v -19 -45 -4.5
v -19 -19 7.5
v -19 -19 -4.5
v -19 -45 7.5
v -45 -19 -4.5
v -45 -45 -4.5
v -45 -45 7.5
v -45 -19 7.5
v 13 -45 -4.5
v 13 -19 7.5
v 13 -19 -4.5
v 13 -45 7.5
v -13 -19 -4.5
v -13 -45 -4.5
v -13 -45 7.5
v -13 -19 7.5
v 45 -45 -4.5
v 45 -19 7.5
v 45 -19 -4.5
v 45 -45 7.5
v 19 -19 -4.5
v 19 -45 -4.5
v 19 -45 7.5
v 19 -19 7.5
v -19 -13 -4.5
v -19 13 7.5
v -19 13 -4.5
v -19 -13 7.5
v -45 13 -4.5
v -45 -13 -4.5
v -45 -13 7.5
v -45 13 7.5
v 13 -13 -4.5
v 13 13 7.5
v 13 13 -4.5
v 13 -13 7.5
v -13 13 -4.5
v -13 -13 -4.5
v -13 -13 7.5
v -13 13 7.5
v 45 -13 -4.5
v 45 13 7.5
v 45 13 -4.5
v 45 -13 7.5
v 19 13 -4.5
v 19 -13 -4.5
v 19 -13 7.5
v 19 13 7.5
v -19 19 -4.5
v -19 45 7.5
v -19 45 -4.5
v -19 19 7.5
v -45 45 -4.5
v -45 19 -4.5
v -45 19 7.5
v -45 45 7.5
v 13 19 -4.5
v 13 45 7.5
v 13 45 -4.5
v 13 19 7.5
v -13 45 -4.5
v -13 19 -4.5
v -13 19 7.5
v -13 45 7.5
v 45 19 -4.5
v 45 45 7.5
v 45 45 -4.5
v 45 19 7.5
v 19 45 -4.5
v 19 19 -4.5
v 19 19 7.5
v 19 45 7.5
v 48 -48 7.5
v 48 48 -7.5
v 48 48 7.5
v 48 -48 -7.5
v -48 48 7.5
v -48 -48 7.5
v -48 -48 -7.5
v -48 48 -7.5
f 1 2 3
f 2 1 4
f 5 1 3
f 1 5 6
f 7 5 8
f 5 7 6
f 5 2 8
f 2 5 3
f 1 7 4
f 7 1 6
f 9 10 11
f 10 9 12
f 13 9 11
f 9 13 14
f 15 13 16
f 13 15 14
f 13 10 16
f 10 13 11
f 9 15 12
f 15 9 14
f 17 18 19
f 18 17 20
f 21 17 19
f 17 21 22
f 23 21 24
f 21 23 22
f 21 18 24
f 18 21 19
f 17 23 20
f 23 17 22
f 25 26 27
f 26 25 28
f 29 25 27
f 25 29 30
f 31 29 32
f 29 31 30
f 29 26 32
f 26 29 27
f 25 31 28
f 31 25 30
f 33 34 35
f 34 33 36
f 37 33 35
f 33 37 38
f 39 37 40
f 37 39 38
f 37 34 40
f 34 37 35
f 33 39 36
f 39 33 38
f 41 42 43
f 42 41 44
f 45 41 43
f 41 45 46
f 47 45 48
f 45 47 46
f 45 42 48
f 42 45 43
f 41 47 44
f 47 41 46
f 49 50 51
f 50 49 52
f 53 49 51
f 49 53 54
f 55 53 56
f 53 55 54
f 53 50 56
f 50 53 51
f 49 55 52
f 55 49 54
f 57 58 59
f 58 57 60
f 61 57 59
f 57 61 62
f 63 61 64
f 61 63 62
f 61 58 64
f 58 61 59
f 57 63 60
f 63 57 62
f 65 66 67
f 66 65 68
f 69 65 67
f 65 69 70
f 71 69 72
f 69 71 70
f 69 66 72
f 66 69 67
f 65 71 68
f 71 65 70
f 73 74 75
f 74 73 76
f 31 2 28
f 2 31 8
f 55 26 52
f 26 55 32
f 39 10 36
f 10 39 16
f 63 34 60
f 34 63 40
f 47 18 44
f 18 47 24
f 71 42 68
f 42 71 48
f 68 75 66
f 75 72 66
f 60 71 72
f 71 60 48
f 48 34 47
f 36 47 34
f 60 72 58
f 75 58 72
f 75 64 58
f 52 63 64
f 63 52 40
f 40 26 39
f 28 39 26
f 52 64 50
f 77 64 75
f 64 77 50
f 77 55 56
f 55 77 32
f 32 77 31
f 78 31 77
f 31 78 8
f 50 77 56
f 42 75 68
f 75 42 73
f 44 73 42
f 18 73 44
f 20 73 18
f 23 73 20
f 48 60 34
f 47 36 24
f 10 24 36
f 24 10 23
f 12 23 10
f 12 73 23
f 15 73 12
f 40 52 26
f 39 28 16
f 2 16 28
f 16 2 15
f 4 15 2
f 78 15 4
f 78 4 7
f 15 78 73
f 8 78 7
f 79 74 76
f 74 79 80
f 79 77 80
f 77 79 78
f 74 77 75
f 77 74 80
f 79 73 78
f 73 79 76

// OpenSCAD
$fn = 32;

// ----------------------------------------------------------------------
// Pocket plate 96 x 96 x 15
// 3 x 3 pockets 26 mm square, 12 mm deep
// ----------------------------------------------------------------------

// --- parameters (mm) ---
thickness = 15;  // plate thickness
floor_t = 3;     // material left under each pocket
pocket = 26;     // pocket side length
pitch_x = 32;    // pocket pitch along X
pitch_y = 32;    // pocket pitch along Y
cols = 3;        // pockets per row
rows = 3;        // rows of pockets

// --- derived feature positions (mm) ---
depth = thickness - floor_t;        // = 12   pocket depth, down to the floor
span_x = (cols - 1) * pitch_x;      // = 64   distance between outer pockets
span_y = (rows - 1) * pitch_y;      // = 64   distance between outer pocket rows
origin_x = -span_x / 2;             // = -32   X of the first pocket
origin_y = -span_y / 2;             // = -32   Y of the first pocket
plate = [span_x + pocket + 6, span_y + pocket + 6, thickness];  // = [96, 96, 15]   overall size: pockets plus 3 mm of wall on each side
feature_centers = [
  [origin_x + 0 * pitch_x, origin_y + 0 * pitch_y],
  [origin_x + 1 * pitch_x, origin_y + 0 * pitch_y],
  [origin_x + 2 * pitch_x, origin_y + 0 * pitch_y],
  [origin_x + 0 * pitch_x, origin_y + 1 * pitch_y],
  [origin_x + 1 * pitch_x, origin_y + 1 * pitch_y],
  [origin_x + 2 * pitch_x, origin_y + 1 * pitch_y],
  [origin_x + 0 * pitch_x, origin_y + 2 * pitch_y],
  [origin_x + 1 * pitch_x, origin_y + 2 * pitch_y],
  [origin_x + 2 * pitch_x, origin_y + 2 * pitch_y]
];   // pocket centres, used verbatim by the cutter loop

// plate outline, then one pocket per centre in feature_centers
difference() {
  cube(plate, center = true);
  for (centre = feature_centers)
    translate([centre[0] - pocket / 2, centre[1] - pocket / 2, plate[2] / 2 - depth])
      cube([pocket, pocket, depth + 1]);  // centred on the declared pocket centre
}
